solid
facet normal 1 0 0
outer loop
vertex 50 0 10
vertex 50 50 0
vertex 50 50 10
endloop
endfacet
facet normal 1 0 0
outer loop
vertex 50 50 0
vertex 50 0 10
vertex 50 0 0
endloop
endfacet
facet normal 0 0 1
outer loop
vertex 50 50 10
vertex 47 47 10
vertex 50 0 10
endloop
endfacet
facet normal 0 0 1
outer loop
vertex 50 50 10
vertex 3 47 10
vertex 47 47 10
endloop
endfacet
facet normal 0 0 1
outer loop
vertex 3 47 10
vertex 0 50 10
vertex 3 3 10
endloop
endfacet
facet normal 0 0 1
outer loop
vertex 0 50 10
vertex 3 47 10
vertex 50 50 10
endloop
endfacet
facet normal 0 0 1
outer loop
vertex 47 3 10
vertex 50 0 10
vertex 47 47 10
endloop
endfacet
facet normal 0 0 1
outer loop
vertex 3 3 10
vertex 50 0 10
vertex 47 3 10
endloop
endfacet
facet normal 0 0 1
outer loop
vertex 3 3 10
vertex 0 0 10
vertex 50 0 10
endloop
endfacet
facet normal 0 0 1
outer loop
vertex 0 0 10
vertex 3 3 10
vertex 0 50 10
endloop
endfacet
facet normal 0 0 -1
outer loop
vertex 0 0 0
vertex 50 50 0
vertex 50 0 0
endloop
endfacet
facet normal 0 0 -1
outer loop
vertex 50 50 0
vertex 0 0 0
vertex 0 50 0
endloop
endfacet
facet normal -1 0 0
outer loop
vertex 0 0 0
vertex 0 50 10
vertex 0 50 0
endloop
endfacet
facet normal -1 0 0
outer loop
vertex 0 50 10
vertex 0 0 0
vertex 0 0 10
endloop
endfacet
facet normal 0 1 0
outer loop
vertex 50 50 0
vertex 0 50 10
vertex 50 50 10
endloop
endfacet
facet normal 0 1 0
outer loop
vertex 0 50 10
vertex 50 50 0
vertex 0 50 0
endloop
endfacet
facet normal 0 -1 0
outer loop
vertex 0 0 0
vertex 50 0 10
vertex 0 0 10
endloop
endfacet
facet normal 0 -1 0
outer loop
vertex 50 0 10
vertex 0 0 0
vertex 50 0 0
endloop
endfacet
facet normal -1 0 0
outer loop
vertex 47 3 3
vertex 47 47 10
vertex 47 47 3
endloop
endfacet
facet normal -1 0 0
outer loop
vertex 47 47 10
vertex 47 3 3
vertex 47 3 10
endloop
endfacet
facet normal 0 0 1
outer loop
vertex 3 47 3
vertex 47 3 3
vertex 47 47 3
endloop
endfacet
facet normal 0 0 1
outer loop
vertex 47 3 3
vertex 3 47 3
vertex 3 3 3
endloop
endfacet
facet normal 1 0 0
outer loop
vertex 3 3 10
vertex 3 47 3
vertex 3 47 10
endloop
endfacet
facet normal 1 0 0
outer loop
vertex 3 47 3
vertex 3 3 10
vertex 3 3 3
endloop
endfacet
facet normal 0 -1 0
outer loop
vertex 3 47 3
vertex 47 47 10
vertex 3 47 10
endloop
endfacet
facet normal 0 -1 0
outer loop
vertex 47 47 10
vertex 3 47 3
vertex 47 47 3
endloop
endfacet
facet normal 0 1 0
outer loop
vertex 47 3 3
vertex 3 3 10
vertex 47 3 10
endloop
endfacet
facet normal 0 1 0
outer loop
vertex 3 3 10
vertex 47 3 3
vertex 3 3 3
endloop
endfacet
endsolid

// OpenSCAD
// Generated by HEIDI for job job_1787786632651_a8b46da0
// Product: 3D-Printable Model Preparation Package
// Request: Failure injection test
// Model type: box
// Generated: 2026-09-07T04:35:16.214Z
//
// This is a parameterized OpenSCAD model. You can adjust the
// parameters below to customize the dimensions before rendering.

// ─── Parameters ───
width = 50;       // X dimension in mm
height = 50;     // Y dimension in mm
depth = 10;       // Z dimension in mm
wall = 3;    // wall thickness in mm
$fn = 60;               // facet resolution

// Parametric hollow box
module parametric_box() {
    difference() {
        // Outer shell
        cube([width, height, depth]);
        // Inner cavity
        translate([wall, wall, wall])
            cube([width - wall * 2, height - wall * 2, depth - wall + 1]);
    }
}
parametric_box();
